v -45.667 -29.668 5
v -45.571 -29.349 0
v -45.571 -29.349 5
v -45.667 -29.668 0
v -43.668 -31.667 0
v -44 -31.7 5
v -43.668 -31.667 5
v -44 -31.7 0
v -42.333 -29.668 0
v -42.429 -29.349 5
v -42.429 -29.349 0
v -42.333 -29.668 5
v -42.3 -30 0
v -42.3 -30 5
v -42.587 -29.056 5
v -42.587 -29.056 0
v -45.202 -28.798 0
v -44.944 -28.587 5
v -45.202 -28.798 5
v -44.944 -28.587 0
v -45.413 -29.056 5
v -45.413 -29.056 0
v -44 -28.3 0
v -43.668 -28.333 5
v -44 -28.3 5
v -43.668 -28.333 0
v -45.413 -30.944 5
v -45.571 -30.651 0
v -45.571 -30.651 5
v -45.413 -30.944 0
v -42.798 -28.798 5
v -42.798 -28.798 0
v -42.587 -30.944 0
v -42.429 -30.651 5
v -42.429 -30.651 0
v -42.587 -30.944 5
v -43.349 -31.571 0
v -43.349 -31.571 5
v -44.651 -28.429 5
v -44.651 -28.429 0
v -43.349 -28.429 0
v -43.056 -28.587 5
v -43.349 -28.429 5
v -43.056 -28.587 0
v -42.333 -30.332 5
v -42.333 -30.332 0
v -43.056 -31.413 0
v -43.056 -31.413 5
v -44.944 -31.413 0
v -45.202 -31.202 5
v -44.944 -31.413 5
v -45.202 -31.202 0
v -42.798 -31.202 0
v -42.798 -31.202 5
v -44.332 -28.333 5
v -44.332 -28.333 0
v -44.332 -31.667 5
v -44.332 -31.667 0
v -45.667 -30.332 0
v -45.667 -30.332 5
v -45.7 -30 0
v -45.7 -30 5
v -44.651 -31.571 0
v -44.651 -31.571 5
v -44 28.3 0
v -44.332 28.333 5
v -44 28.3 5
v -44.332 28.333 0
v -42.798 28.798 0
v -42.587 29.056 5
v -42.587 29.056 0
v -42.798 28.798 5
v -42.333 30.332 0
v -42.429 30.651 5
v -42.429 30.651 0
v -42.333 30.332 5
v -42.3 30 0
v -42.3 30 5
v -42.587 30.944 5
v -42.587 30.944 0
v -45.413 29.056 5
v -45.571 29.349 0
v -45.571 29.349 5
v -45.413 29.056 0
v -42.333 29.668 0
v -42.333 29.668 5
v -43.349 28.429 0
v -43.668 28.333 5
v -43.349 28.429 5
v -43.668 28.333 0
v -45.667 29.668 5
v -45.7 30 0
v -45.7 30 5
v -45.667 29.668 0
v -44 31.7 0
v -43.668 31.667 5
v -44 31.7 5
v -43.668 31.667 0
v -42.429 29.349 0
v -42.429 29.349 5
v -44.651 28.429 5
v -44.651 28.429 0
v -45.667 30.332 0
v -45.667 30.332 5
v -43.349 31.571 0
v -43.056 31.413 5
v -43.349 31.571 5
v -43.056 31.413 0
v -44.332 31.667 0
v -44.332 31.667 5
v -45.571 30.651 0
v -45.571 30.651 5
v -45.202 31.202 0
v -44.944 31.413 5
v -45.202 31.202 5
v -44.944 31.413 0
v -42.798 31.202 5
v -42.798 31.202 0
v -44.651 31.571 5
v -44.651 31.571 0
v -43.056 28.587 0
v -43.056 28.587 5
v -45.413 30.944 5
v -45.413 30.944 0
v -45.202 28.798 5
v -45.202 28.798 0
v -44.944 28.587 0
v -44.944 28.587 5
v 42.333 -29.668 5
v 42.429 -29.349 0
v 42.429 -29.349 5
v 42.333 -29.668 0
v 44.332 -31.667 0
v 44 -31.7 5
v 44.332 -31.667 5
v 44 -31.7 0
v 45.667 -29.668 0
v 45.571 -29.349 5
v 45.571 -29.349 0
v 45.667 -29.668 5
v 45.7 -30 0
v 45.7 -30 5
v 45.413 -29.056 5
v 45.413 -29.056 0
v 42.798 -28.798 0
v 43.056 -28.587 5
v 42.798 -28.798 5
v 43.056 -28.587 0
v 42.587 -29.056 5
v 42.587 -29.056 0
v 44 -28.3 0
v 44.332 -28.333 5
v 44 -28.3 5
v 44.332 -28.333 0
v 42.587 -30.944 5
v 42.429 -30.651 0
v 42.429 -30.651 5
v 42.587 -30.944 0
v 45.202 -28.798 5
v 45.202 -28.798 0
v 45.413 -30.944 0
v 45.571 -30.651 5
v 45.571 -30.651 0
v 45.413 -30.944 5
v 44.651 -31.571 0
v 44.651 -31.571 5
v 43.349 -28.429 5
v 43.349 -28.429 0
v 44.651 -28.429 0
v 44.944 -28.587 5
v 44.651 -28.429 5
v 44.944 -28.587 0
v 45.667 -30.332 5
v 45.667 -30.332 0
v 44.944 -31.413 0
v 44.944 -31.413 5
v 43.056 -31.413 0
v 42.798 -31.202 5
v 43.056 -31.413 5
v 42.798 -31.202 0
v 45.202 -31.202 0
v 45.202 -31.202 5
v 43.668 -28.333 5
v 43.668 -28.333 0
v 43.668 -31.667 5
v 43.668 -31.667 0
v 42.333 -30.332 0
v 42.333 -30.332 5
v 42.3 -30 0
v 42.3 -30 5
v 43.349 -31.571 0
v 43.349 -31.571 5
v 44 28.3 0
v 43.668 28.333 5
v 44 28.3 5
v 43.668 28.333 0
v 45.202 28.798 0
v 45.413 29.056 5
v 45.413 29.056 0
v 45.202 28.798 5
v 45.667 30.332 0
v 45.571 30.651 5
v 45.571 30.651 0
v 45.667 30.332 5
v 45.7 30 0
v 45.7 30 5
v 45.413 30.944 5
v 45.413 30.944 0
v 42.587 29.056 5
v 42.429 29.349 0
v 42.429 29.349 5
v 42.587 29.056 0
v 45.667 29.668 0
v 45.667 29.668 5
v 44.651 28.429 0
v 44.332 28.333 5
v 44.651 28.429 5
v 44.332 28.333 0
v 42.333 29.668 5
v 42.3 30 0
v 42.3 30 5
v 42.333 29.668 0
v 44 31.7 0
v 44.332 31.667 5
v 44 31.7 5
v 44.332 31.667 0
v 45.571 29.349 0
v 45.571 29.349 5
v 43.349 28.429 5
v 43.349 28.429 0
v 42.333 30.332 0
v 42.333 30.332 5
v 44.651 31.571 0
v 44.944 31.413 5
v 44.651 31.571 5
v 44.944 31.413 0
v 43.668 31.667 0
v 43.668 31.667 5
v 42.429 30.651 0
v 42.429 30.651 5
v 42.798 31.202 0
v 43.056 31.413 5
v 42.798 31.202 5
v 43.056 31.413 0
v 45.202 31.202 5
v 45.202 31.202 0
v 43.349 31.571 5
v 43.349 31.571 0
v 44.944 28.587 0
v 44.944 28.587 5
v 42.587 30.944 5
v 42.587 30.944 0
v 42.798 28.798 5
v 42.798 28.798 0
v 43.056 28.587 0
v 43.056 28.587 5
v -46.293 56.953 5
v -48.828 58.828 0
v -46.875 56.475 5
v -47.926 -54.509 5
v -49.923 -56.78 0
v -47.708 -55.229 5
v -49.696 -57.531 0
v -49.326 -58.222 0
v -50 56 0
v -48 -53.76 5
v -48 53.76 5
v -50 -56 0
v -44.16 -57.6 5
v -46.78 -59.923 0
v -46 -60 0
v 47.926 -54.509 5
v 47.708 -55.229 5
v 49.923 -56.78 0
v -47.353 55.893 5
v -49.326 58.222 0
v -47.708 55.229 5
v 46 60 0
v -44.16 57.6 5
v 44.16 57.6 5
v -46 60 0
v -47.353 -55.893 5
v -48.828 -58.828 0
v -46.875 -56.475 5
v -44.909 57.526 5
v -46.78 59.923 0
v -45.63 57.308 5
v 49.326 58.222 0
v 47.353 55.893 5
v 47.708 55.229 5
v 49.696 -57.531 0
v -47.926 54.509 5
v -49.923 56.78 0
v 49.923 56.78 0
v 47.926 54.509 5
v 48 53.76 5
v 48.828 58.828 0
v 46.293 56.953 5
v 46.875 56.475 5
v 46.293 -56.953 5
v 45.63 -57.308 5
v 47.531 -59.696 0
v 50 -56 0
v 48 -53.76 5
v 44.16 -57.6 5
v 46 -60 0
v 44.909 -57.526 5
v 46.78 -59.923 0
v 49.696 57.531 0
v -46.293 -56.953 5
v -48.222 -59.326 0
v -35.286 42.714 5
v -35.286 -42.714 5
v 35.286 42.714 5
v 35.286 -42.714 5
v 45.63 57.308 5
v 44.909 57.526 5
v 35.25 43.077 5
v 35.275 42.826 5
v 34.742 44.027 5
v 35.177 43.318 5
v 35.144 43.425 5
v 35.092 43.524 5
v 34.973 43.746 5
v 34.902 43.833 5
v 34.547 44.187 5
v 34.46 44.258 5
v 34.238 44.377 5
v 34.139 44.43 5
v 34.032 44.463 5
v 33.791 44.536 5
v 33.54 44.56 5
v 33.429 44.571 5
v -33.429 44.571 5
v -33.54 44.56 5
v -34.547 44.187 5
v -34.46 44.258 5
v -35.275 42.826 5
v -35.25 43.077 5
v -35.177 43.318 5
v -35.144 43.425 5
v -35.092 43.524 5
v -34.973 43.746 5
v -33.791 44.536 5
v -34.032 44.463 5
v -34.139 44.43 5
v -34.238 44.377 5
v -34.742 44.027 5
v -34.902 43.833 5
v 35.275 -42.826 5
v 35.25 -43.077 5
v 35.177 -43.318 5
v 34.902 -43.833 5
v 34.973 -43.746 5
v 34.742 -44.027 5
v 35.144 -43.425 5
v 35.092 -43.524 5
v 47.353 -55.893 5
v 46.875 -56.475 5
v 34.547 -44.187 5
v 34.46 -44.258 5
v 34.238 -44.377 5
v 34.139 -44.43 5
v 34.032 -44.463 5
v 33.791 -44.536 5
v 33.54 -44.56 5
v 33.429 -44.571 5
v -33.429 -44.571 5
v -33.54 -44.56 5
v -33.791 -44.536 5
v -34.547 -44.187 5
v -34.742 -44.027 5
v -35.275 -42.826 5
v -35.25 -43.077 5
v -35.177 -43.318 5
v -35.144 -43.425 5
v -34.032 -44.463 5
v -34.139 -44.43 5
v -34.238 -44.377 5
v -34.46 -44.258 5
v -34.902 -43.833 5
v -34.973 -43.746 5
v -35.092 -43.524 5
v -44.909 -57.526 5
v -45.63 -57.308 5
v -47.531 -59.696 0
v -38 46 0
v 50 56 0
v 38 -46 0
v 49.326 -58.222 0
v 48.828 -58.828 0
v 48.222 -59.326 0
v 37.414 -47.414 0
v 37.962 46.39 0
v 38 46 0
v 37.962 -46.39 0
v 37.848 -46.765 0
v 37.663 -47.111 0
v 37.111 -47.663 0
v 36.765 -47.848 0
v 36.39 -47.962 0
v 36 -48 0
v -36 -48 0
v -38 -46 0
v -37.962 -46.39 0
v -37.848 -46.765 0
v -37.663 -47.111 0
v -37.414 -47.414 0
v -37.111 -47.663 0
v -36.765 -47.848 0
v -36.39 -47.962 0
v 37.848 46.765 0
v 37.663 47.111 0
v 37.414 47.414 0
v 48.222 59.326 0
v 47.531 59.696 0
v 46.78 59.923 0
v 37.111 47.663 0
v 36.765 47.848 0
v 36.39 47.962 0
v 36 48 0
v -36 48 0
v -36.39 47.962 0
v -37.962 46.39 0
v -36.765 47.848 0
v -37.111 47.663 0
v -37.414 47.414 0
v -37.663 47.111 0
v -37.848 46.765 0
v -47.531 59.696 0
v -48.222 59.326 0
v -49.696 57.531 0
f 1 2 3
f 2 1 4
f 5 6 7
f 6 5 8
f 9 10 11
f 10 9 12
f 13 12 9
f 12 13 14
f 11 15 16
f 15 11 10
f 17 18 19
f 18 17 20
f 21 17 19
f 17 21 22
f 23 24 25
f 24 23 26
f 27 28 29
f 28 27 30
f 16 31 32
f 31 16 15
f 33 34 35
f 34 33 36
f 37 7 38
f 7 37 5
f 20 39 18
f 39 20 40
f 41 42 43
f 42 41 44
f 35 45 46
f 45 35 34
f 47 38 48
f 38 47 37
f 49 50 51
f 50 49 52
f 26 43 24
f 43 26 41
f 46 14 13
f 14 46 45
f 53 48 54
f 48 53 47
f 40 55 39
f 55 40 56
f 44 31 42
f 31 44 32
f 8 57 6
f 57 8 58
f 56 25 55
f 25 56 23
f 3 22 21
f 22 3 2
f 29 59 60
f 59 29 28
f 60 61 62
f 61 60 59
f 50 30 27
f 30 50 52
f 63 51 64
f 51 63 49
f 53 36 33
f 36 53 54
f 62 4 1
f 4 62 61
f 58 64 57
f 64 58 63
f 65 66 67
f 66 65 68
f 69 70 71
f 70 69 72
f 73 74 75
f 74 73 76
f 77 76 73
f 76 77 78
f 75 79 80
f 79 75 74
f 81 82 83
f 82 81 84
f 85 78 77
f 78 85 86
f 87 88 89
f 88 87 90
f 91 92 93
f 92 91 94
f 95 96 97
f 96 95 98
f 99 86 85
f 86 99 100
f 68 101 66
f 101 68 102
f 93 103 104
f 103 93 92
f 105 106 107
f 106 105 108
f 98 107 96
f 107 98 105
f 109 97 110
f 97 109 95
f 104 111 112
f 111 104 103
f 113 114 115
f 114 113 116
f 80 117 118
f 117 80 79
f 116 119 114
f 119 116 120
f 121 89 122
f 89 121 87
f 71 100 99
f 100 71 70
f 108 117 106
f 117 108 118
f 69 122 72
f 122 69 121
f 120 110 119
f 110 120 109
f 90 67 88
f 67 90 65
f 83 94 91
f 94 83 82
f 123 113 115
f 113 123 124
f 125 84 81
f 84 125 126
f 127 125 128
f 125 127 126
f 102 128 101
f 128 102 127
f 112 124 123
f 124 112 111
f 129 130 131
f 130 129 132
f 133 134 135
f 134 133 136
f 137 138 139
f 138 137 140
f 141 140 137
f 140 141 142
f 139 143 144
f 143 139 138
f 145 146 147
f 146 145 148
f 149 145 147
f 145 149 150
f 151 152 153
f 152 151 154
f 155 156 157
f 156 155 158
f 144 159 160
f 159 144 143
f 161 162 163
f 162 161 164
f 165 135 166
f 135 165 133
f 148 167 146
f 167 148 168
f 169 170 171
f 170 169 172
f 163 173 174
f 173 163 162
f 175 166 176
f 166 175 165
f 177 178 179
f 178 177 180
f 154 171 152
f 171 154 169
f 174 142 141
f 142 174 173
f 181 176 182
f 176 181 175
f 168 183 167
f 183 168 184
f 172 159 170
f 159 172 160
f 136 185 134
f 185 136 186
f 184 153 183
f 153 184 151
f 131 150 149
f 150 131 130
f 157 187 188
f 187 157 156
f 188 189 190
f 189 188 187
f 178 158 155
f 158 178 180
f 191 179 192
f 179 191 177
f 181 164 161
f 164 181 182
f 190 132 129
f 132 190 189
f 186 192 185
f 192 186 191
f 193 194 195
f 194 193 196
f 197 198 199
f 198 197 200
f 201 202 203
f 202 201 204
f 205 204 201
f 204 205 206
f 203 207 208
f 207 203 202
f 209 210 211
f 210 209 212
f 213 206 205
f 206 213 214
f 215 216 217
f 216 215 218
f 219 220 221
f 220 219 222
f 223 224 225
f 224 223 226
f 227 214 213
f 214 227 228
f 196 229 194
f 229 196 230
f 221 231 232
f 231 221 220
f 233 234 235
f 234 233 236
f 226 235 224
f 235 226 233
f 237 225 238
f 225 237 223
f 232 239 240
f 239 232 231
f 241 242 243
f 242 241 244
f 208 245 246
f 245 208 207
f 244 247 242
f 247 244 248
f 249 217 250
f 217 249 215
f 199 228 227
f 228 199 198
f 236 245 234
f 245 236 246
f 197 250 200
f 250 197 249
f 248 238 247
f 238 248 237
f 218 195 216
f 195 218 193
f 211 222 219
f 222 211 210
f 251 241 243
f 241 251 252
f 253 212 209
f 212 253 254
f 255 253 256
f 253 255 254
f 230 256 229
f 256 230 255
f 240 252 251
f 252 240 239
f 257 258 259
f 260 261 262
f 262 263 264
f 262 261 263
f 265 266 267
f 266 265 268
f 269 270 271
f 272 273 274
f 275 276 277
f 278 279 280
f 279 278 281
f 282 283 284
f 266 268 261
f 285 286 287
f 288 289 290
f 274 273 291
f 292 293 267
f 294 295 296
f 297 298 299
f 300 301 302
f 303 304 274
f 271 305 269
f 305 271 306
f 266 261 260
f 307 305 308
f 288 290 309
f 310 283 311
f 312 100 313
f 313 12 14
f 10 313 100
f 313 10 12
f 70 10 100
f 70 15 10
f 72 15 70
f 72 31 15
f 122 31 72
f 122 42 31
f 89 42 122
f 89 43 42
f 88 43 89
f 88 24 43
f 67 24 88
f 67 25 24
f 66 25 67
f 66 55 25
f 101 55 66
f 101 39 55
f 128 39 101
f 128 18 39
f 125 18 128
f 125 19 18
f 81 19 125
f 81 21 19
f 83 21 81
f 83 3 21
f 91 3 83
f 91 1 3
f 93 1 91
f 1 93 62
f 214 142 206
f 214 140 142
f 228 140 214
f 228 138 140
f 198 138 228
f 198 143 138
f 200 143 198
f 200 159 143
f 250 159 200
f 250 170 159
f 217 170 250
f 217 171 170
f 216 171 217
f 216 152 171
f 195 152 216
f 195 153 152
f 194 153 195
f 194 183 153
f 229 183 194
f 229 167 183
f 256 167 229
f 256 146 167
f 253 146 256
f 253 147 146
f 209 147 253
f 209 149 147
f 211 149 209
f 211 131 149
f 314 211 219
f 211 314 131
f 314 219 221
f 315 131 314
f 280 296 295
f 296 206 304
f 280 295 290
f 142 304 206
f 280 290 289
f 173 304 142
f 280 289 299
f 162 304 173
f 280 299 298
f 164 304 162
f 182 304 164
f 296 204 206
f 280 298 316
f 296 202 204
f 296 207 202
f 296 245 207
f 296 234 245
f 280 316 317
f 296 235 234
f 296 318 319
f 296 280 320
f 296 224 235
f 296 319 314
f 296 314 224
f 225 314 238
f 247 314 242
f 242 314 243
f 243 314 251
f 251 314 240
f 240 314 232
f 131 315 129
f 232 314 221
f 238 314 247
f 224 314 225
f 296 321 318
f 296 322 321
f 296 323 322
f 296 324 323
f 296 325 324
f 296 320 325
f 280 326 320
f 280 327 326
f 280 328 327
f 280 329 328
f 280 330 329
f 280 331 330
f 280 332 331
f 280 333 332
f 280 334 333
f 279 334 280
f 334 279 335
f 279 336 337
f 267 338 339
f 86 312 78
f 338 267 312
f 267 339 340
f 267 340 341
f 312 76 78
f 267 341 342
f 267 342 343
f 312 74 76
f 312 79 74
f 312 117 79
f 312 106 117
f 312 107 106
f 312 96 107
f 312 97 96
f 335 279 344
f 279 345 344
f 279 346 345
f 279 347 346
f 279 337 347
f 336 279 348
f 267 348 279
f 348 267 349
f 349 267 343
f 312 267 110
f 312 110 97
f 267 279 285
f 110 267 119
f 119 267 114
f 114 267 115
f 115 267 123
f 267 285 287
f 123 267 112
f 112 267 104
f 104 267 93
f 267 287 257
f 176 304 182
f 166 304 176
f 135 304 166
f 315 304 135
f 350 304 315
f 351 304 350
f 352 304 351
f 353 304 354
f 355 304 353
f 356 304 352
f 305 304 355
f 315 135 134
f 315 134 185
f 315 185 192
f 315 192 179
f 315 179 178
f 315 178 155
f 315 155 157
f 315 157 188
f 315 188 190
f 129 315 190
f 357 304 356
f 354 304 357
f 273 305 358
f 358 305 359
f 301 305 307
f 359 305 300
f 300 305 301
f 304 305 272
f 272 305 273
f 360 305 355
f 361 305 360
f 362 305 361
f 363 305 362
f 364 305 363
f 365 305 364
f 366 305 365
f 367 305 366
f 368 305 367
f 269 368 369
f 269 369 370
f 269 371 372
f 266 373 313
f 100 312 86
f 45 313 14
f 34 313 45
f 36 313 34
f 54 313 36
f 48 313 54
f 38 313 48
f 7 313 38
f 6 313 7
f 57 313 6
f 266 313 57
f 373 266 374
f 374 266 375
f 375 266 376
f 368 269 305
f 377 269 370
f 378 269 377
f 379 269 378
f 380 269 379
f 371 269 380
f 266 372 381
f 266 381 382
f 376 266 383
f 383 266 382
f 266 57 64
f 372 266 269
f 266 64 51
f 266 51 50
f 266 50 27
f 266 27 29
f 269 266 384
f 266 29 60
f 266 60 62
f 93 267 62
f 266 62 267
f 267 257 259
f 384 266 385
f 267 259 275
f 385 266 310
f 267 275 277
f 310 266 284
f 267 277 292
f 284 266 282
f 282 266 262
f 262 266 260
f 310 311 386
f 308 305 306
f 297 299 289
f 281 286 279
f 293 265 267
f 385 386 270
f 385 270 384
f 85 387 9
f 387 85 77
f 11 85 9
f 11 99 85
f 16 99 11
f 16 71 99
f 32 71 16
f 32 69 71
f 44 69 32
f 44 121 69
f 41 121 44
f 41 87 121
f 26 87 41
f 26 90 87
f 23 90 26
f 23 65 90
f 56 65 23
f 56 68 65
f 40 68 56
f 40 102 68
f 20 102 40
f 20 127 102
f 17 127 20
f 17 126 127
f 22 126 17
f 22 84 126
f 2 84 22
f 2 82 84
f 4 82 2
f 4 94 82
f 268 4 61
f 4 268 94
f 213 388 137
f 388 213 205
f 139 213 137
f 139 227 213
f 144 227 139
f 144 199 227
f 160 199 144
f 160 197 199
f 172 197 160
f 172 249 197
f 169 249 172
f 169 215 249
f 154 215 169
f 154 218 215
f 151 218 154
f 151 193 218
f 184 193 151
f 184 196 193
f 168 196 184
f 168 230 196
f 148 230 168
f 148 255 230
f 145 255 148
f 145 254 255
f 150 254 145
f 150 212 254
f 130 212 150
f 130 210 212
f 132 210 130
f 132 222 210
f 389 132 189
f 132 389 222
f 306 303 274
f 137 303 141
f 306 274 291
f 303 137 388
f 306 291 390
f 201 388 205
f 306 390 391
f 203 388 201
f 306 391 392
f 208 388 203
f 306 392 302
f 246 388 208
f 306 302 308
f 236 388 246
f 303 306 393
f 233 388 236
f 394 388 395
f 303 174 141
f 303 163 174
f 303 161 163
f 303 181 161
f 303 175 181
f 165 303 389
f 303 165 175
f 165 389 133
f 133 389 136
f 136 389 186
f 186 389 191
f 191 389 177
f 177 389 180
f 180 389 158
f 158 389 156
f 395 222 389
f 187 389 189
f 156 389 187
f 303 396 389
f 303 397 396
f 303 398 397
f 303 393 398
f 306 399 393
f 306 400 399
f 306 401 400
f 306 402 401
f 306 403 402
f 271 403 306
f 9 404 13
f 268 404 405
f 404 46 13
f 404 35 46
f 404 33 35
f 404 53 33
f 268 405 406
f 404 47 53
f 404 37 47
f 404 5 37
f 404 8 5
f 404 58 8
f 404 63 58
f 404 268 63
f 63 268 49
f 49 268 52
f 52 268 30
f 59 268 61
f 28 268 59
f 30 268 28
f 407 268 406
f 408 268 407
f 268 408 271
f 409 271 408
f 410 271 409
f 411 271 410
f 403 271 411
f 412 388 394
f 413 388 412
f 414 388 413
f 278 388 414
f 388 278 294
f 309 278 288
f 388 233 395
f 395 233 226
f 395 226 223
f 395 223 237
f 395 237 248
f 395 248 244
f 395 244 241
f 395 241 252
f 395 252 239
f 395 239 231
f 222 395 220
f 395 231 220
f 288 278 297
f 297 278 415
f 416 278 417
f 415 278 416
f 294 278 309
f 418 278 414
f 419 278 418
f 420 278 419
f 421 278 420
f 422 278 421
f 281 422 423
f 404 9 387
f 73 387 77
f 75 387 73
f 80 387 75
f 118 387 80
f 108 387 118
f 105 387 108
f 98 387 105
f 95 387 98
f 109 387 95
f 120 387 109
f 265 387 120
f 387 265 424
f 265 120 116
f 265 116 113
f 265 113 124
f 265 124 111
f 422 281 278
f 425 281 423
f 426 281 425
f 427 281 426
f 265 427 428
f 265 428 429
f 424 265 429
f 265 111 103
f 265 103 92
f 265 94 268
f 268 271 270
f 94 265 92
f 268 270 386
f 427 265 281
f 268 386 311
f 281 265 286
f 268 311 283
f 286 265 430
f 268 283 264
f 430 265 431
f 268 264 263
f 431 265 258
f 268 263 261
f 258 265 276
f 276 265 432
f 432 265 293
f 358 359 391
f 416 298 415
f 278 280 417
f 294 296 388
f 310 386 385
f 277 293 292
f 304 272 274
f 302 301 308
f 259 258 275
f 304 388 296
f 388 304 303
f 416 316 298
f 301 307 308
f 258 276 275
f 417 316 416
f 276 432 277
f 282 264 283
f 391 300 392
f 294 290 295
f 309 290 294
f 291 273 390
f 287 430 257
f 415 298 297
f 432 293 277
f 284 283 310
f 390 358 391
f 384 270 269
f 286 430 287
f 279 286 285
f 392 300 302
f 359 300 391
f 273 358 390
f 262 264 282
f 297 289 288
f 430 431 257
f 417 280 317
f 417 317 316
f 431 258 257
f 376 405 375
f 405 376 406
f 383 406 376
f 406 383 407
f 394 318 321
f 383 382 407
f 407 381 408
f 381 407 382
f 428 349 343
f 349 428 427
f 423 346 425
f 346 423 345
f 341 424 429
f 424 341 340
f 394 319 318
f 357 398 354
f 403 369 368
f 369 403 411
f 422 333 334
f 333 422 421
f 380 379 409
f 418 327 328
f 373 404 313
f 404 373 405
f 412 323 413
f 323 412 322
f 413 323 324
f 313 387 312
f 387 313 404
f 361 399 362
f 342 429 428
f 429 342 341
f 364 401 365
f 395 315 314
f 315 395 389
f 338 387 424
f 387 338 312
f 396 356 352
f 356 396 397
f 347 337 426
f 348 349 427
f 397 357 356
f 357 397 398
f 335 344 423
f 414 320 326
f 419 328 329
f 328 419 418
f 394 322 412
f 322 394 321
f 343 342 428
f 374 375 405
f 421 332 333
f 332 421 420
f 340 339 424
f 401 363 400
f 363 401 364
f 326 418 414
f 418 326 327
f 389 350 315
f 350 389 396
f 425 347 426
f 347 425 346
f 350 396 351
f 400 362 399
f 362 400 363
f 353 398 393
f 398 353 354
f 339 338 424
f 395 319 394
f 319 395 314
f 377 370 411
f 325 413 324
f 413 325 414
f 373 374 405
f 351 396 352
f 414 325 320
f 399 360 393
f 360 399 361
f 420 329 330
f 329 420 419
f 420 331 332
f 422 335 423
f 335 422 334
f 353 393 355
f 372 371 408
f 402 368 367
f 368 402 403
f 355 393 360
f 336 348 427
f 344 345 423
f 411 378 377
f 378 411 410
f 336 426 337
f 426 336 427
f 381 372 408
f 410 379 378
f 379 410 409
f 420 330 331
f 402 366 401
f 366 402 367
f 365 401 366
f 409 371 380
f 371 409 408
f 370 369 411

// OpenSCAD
$fn = 32;

// ----------------------------------------------------------------------
// Display bezel: 100 x 120 mm frame, opening 76x96 mm
// ----------------------------------------------------------------------

// --- parameters (mm) ---
length = 100;             // frame outside length, X
width = 120;              // frame outside width, Y
frame_w = 12;             // frame width
thickness = 5;            // frame thickness
corner_r = 4;             // outside corner radius
chamfer = 0.96;           // outer wall taper
funnel = 0.9;             // inner opening taper
opening_l = 76;           // opening length
opening_w = 96;           // opening width
inner_r = 2;              // opening corner radius
hole_d = 3.4;             // mounting screw clearance
holes_per_side = 2;       // holes per short side
hole_inset = 6;           // hole centre inset from the outside edge

/* rounded-rectangle outlines, generated with loops */
module rounded_ring(l_nom, w_nom, r) {
  hull() {
    for (sx = [-1, 1]) for (sy = [-1, 1])
      translate([sx * (l_nom / 2 - r), sy * (w_nom / 2 - r)]) circle(r = r);
  }
}

difference() {
  /* frame body, drafted so the outer edge is a variable-depth chamfer */
  linear_extrude(height = thickness, scale = chamfer)
    rounded_ring(length, width, corner_r);
  /* viewing opening, drafted the other way for a funnel edge */
  linear_extrude(height = thickness + 2, scale = funnel)
    translate([0, 0, -1]) rounded_ring(opening_l, opening_w, inner_r);
  /* mounting screws through the frame lands */
  for (sx = [-1, 1]) for (i = [1 : holes_per_side])
    translate([sx * (length / 2 - hole_inset),
               (i - (holes_per_side + 1) / 2) * width * 0.5, -1])
      cylinder(h = thickness + 2, d = hole_d);
}
